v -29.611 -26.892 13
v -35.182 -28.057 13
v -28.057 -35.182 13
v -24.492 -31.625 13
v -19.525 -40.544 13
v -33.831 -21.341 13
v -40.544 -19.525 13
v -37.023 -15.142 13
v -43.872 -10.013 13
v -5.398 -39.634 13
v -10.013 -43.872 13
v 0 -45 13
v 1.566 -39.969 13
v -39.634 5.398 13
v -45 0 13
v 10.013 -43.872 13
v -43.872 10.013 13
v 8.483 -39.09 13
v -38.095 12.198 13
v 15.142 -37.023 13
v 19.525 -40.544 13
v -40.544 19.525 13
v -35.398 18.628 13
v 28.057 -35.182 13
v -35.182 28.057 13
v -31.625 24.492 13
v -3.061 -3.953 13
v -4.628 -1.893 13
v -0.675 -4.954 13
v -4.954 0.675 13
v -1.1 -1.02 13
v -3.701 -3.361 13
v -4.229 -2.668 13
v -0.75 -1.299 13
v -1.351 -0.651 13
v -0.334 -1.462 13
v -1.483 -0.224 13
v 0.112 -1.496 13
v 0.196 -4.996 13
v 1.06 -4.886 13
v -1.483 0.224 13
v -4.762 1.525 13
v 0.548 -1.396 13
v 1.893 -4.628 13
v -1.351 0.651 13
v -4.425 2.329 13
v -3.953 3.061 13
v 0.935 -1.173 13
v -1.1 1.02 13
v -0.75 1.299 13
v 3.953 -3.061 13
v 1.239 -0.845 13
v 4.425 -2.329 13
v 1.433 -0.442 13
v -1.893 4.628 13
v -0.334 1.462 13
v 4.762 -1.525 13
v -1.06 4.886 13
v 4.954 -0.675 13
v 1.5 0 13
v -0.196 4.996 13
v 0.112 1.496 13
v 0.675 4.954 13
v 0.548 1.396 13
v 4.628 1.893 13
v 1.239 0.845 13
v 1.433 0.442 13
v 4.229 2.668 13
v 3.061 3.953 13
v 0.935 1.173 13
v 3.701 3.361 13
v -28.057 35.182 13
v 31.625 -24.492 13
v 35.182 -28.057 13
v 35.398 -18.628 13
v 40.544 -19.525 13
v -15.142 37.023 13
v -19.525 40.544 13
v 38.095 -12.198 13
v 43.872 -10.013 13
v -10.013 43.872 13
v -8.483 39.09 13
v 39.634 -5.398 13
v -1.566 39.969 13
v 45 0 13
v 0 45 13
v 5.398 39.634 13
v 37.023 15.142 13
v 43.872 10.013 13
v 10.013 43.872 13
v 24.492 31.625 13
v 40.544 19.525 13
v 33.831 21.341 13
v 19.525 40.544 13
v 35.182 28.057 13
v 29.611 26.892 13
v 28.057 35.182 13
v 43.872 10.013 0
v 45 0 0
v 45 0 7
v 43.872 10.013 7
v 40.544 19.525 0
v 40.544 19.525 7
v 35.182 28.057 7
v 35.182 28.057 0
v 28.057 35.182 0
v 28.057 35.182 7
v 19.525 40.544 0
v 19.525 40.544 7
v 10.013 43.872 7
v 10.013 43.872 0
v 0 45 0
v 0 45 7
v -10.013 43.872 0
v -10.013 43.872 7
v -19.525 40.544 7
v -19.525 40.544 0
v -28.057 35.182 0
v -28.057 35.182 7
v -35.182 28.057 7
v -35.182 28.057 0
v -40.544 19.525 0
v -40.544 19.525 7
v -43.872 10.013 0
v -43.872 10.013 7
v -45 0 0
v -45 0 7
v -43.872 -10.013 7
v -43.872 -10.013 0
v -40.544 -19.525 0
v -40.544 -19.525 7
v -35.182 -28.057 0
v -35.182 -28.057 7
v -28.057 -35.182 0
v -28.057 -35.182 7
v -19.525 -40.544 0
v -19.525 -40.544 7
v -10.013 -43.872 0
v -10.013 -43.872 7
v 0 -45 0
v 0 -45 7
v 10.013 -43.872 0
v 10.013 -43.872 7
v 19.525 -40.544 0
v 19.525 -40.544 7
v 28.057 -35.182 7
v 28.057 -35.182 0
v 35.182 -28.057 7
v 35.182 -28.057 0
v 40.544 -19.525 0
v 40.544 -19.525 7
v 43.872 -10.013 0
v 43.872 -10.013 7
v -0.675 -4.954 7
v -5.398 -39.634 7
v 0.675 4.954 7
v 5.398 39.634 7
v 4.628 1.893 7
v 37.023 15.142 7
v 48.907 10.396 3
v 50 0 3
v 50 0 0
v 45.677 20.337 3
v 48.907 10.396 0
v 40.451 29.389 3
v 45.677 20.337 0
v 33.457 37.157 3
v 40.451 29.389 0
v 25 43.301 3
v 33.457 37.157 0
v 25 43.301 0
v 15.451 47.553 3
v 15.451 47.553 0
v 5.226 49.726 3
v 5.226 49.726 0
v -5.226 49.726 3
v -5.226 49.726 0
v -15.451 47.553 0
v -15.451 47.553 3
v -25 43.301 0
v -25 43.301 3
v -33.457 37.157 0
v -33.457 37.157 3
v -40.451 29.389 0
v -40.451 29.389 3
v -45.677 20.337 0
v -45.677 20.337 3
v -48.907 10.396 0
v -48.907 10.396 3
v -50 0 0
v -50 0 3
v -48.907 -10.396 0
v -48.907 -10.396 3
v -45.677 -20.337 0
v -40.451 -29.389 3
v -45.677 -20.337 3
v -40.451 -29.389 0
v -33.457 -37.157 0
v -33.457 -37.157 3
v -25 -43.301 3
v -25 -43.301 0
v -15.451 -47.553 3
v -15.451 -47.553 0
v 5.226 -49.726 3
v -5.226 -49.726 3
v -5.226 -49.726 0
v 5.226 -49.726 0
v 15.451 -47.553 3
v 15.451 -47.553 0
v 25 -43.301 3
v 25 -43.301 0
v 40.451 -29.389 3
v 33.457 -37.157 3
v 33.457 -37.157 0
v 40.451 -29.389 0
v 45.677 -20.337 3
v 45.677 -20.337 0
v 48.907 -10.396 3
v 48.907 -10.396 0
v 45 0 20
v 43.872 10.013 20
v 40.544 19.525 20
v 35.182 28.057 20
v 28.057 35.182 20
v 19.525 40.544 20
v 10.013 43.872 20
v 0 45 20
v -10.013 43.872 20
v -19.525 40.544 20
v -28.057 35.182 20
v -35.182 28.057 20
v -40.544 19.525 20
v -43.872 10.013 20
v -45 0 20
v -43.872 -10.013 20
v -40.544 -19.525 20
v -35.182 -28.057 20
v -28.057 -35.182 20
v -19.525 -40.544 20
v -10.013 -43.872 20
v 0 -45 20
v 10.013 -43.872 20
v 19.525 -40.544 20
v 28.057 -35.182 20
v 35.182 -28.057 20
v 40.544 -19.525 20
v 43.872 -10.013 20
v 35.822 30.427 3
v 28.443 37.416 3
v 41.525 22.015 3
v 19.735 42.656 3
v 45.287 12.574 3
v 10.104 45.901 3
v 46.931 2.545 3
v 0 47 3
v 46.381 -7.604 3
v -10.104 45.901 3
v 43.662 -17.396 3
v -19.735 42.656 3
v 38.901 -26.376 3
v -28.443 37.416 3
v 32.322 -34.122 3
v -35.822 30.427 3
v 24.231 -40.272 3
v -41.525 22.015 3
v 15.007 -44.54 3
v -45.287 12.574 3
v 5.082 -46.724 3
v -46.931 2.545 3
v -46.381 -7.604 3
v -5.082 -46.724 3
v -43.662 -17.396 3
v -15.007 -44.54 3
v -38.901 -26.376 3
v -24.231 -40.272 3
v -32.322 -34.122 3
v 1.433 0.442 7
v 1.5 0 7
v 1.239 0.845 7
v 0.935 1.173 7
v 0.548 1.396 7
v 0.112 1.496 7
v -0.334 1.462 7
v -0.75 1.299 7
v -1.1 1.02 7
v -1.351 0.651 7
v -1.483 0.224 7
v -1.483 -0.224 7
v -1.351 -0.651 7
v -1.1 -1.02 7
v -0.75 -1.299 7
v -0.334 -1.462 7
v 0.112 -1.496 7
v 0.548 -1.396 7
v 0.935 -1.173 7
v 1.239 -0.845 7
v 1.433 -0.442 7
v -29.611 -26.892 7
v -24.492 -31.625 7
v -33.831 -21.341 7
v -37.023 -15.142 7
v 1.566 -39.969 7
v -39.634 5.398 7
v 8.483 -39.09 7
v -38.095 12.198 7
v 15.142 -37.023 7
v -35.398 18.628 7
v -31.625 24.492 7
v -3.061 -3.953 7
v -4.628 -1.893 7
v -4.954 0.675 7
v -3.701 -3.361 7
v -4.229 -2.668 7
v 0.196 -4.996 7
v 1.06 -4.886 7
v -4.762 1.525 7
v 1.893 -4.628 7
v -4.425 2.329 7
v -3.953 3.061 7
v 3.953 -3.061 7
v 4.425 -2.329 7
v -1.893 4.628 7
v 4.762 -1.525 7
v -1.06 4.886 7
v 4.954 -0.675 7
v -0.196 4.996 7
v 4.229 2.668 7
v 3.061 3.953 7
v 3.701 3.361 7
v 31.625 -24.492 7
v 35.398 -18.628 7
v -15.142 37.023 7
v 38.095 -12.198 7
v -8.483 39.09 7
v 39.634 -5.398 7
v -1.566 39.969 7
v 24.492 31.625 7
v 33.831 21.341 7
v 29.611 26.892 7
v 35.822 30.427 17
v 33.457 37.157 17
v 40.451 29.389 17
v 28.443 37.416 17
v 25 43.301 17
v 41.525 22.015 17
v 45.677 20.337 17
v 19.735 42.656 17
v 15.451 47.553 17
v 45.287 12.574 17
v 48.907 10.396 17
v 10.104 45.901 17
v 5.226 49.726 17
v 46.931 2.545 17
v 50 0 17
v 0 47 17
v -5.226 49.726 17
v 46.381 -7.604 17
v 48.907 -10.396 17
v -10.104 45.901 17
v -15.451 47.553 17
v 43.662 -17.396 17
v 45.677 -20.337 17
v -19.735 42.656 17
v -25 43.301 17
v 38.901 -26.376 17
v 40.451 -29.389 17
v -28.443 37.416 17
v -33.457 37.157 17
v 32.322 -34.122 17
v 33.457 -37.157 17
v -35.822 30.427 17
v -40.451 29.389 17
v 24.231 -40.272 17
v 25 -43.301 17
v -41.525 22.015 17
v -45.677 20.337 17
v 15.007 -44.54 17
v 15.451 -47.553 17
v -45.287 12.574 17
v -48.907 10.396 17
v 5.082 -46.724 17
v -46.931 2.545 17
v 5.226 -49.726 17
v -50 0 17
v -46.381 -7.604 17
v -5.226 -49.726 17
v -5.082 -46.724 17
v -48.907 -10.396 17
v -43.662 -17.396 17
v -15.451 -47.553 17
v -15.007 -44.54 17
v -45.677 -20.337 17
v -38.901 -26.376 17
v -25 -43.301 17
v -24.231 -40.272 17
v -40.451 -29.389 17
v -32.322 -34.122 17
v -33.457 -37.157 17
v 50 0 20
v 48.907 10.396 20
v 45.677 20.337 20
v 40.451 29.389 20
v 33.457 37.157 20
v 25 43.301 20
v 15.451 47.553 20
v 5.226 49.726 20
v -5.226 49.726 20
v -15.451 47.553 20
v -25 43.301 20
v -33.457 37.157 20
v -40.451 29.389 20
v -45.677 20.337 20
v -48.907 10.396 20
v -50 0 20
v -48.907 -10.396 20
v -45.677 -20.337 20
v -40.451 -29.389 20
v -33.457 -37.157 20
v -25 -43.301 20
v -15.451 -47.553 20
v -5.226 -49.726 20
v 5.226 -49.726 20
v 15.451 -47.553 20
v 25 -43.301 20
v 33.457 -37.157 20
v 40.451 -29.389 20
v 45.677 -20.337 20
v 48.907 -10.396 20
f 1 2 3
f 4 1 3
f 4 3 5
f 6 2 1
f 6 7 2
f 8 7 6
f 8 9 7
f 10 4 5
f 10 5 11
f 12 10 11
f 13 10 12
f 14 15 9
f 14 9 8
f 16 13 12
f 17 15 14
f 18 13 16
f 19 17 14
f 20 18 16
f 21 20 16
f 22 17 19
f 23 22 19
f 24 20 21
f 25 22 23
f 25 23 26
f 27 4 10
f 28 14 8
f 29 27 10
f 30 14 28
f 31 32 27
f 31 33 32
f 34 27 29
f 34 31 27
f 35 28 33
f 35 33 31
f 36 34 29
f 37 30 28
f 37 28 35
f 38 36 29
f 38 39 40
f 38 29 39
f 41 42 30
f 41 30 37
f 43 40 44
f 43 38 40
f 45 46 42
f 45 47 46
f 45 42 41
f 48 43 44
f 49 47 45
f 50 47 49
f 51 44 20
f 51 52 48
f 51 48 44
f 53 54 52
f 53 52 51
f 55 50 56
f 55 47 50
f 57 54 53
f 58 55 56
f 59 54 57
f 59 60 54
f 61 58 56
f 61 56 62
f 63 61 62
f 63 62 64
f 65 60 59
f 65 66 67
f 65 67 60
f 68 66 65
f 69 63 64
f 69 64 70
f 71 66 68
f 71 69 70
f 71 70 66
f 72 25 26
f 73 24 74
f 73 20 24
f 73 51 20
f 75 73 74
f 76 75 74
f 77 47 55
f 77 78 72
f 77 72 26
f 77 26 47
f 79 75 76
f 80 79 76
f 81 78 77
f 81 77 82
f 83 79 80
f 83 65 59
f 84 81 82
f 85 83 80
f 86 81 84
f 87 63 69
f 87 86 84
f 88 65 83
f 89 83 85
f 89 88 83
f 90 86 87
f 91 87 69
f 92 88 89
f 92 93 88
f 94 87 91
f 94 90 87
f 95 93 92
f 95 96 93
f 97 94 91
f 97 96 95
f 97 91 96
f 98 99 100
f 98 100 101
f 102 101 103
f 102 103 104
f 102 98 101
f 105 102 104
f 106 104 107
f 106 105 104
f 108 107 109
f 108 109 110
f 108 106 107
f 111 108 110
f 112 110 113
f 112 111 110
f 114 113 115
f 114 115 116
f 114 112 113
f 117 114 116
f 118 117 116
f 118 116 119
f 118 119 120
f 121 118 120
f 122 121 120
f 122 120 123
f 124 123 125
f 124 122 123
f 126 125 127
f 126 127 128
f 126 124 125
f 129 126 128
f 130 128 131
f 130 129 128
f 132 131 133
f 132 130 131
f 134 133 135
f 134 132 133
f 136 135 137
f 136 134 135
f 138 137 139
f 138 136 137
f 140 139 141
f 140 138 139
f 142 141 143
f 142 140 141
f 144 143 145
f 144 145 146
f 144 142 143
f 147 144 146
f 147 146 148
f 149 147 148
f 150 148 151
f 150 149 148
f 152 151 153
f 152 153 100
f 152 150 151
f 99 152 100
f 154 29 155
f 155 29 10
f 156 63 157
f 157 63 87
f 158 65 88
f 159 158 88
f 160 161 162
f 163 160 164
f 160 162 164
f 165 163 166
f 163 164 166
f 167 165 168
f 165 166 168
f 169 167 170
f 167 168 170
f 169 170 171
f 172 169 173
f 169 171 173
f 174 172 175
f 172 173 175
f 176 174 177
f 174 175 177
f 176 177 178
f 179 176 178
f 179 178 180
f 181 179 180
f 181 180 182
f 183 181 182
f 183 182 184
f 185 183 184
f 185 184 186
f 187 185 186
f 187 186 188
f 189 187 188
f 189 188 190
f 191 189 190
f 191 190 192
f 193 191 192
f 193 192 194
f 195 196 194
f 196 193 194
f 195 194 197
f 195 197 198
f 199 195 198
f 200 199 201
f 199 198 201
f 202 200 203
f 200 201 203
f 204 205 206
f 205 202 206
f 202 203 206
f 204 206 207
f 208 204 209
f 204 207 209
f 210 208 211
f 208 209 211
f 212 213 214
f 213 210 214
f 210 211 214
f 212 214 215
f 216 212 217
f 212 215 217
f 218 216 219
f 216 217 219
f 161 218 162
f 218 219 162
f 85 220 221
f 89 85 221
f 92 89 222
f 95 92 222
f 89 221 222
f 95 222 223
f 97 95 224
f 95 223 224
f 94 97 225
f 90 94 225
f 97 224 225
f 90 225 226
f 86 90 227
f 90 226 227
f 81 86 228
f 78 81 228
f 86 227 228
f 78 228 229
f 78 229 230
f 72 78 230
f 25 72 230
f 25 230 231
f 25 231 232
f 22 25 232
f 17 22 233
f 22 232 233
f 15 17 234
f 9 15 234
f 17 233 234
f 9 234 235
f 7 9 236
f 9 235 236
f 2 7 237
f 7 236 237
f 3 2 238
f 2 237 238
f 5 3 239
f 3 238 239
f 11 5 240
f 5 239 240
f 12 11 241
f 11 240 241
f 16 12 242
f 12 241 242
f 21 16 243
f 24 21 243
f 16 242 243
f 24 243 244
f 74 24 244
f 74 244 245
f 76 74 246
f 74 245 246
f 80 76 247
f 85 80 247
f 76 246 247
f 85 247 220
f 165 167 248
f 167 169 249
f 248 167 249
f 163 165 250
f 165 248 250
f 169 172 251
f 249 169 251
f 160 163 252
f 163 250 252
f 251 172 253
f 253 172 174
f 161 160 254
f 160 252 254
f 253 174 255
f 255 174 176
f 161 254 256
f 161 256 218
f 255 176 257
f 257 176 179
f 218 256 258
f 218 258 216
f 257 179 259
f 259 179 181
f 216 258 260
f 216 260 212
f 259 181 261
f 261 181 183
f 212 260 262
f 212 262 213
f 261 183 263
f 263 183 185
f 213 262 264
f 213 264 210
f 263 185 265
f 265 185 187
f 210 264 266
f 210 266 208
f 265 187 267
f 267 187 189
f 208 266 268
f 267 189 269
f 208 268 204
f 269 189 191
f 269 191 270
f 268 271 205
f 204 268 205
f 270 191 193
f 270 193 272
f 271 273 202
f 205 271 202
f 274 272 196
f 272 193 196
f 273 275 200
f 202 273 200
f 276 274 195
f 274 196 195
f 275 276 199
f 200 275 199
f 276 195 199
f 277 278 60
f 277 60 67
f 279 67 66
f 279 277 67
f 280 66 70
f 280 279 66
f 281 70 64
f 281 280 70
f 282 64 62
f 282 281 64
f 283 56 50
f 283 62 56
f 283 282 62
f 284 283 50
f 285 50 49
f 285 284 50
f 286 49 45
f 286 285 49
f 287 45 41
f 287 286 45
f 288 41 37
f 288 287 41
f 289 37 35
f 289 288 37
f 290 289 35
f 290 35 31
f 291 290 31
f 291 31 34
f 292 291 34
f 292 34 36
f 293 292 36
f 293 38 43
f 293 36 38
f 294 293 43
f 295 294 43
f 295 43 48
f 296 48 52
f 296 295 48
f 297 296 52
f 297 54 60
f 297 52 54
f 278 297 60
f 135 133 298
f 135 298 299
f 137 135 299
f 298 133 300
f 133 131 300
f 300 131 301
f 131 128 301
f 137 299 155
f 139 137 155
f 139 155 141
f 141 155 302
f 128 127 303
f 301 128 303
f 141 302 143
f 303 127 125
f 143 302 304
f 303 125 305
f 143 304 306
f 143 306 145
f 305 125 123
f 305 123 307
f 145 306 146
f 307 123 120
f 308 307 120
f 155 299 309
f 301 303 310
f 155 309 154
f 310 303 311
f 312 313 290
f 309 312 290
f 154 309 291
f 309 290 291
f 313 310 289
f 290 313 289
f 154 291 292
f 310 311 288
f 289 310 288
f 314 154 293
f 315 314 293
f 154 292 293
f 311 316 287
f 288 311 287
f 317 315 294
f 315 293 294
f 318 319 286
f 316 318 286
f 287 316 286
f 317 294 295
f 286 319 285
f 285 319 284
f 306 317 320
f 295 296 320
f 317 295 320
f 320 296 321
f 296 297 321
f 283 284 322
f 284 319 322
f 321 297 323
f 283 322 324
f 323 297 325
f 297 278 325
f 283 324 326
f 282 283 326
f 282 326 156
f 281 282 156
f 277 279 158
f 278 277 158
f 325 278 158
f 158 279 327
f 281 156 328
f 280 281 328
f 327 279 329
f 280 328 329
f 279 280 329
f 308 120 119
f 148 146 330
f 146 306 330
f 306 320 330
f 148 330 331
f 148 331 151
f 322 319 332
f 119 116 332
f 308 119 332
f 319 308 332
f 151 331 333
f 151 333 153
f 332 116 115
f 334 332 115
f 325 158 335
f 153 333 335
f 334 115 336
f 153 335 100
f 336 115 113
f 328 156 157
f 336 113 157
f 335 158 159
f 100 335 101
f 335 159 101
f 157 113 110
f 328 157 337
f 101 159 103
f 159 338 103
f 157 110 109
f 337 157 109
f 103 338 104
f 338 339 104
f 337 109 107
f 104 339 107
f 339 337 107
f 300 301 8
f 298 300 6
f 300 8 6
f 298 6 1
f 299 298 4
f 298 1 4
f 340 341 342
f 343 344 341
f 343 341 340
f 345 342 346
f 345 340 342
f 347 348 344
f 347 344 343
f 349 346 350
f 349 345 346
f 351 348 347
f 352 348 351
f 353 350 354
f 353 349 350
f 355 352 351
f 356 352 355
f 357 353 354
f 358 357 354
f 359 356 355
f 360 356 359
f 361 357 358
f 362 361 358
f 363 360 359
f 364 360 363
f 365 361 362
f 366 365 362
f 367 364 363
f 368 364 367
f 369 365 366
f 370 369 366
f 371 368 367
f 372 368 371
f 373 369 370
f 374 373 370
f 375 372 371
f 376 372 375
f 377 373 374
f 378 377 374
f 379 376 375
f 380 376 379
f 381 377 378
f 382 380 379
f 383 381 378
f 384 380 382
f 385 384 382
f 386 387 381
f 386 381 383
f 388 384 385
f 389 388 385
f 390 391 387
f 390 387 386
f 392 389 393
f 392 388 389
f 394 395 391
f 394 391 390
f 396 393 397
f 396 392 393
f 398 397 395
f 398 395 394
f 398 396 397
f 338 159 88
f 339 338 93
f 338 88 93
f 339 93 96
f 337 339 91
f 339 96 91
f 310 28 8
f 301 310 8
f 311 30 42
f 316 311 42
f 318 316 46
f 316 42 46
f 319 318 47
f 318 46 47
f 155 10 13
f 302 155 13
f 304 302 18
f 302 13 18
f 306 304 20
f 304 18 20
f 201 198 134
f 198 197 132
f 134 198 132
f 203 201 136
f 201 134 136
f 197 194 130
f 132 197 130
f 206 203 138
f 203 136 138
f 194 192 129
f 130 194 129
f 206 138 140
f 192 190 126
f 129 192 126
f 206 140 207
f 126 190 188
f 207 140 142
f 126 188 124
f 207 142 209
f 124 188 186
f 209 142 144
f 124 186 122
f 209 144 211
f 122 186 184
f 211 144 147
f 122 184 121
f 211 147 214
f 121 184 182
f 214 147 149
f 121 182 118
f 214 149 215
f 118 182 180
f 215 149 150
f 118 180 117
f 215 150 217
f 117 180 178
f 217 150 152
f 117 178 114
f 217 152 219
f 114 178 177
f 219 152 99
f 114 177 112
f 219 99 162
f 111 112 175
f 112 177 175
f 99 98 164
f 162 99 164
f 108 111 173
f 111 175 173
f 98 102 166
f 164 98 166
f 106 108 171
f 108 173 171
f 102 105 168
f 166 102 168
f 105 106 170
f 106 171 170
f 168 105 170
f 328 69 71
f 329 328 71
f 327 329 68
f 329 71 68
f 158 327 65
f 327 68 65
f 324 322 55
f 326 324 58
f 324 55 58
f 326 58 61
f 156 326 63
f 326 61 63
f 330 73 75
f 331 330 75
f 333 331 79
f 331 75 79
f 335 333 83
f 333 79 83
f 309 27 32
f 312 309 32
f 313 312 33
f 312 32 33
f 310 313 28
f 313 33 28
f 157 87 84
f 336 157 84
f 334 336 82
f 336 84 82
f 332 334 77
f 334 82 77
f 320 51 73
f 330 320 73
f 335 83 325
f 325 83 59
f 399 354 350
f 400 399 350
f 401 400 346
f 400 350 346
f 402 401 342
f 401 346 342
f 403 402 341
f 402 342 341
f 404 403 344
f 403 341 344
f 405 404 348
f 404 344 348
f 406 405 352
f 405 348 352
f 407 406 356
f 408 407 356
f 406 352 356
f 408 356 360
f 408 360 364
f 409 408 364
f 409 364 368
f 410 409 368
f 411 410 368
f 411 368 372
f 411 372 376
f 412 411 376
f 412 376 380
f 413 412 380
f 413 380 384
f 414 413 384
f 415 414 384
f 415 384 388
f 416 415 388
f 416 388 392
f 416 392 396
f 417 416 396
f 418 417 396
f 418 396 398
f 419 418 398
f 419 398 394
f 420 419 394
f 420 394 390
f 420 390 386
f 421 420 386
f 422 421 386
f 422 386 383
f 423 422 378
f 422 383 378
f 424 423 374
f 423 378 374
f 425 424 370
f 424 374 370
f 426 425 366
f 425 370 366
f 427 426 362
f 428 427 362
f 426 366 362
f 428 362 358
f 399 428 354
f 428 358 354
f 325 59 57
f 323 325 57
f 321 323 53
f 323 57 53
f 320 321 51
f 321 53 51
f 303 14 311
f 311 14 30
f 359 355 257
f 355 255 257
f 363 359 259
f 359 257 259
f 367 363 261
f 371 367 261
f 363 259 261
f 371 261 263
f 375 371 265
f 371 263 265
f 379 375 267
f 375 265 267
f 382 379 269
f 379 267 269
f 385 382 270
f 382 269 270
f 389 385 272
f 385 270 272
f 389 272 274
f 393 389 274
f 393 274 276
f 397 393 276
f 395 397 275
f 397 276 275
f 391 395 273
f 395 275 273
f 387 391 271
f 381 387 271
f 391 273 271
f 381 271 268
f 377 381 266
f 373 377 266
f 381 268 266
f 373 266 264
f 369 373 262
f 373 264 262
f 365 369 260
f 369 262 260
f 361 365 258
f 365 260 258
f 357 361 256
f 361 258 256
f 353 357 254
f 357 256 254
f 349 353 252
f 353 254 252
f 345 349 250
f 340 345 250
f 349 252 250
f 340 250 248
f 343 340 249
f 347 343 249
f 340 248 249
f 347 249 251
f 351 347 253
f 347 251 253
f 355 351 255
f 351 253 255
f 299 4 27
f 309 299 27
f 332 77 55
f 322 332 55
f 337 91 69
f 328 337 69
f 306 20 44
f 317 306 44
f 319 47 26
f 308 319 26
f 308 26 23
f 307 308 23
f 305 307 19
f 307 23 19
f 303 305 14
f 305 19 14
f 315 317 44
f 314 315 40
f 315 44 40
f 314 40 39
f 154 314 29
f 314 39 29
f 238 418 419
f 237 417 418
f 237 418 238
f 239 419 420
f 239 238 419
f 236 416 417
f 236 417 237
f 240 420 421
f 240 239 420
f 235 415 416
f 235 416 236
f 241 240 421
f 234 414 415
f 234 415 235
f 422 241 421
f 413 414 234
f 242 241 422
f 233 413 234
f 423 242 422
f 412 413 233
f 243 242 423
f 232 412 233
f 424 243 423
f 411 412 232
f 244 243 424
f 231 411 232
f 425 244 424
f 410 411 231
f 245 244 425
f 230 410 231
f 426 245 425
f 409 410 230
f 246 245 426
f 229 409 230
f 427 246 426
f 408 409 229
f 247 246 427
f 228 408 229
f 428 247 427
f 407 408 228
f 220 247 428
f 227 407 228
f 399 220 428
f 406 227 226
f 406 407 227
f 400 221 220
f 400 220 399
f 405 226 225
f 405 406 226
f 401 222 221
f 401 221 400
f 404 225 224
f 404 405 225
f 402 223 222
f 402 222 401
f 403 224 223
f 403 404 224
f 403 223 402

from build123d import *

# Parameters (mm, degrees)
ESQUISSE2_R             = 50
BOSS_EXTRU_1_DEPTH      = 20
ESQUISSE3_R             = 45
ENL_V_MAT_EXTRU_1_DEPTH = 7
ESQUISSE4_R             = 45
ENL_V_MAT_EXTRU_2_DEPTH = 7
ENL_V_MAT_EXTRU_3_DEPTH = 14
ESQUISSE7_W             = 14
ESQUISSE7_H             = 4.126499196
ESQUISSE8_R             = 1.5
ENL_V_MAT_EXTRU_4_DEPTH = 21


with BuildPart() as part:
    # Esquisse2 → Boss.-Extru.1 (new body)
    with BuildSketch(Plane.XY):
        Circle(ESQUISSE2_R)
    extrude(amount=BOSS_EXTRU_1_DEPTH)

    # Esquisse3 → Enlèv. mat.-Extru.1 (cut)
    with BuildSketch(Plane.XY):
        Circle(ESQUISSE3_R)
    extrude(amount=ENL_V_MAT_EXTRU_1_DEPTH, mode=Mode.SUBTRACT)

    # Esquisse4 → Enlèv. mat.-Extru.2 (cut)
    with BuildSketch(Plane.XY.offset(20)):
        Circle(ESQUISSE4_R)
    extrude(amount=-ENL_V_MAT_EXTRU_2_DEPTH, mode=Mode.SUBTRACT)

    # Esquisse6 → Enlèv. mat.-Extru.3 (cut, through all)
    with BuildSketch(Plane.XY.offset(13)):
        with BuildLine():
            ThreePointArc((3.061476111, 3.953146092), (3.980308338, 3.026077582), (4.627889131, 1.892786885))
            Line((4.627889131, 1.892786885), (37.023113047, 15.142295082))
            ThreePointArc((37.023113047, 15.142295082), (31.842466708, 24.208620654), (24.491808885, 31.625168736))
            Line((24.491808885, 31.625168736), (3.061476111, 3.953146092))
        make_face()
        with BuildLine():
            ThreePointArc((-1.892786885, 4.627889131), (-0.63050589, 4.960086927), (0.674743039, 4.954262996))
            Line((0.674743039, 4.954262996), (5.397944311, 39.634103966))
            ThreePointArc((5.397944311, 39.634103966), (-5.044047123, 39.680695415), (-15.142295082, 37.023113047))
            Line((-15.142295082, 37.023113047), (-1.892786885, 4.627889131))
        make_face()
        with BuildLine():
            ThreePointArc((-4.954262996, 0.674743039), (-4.610814229, 1.934009345), (-3.953146092, 3.061476111))
            Line((-3.953146092, 3.061476111), (-31.625168736, 24.491808885))
            ThreePointArc((-31.625168736, 24.491808885), (-36.886513831, 15.472074761), (-39.634103966, 5.397944311))
            Line((-39.634103966, 5.397944311), (-4.954262996, 0.674743039))
        make_face()
        with BuildLine():
            Line((-24.491808885, -31.625168736), (-3.061476111, -3.953146092))
            ThreePointArc((-3.061476111, -3.953146092), (-3.980308338, -3.026077582), (-4.627889131, -1.892786885))
            Line((-4.627889131, -1.892786885), (-37.023113047, -15.142295082))
            ThreePointArc((-37.023113047, -15.142295082), (-31.842466708, -24.208620654), (-24.491808885, -31.625168736))
        make_face()
        with BuildLine():
            Line((15.142295082, -37.023113047), (1.892786885, -4.627889131))
            ThreePointArc((1.892786885, -4.627889131), (0.63050589, -4.960086927), (-0.674743039, -4.954262996))
            Line((-0.674743039, -4.954262996), (-5.397944311, -39.634103966))
            ThreePointArc((-5.397944311, -39.634103966), (5.044047123, -39.680695415), (15.142295082, -37.023113047))
        make_face()
        with BuildLine():
            Line((39.634103966, -5.397944311), (4.954262996, -0.674743039))
            ThreePointArc((4.954262996, -0.674743039), (4.610814229, -1.934009345), (3.953146092, -3.061476111))
            Line((3.953146092, -3.061476111), (31.625168736, -24.491808885))
            ThreePointArc((31.625168736, -24.491808885), (36.886513831, -15.472074761), (39.634103966, -5.397944311))
        make_face()
    extrude(amount=-ENL_V_MAT_EXTRU_3_DEPTH, mode=Mode.SUBTRACT)

    # Esquisse7 → Enlèvement de matière-Révolution1 (revolve, cut)
    with BuildSketch(Plane(origin=(0, 0, 0), x_dir=(0, 0, -1), z_dir=(1, 0, 0))):
        with Locations((-10, 49.063249598)):
            Rectangle(ESQUISSE7_W, ESQUISSE7_H)
    revolve(axis=Axis((0, 0, 0), (0, 0, 1)), mode=Mode.SUBTRACT)

    # Esquisse8 → Enlèv. mat.-Extru.4 (cut, through all)
    with BuildSketch(Plane.XY):
        Circle(ESQUISSE8_R)
    extrude(amount=ENL_V_MAT_EXTRU_4_DEPTH, mode=Mode.SUBTRACT)


solid = part.part
